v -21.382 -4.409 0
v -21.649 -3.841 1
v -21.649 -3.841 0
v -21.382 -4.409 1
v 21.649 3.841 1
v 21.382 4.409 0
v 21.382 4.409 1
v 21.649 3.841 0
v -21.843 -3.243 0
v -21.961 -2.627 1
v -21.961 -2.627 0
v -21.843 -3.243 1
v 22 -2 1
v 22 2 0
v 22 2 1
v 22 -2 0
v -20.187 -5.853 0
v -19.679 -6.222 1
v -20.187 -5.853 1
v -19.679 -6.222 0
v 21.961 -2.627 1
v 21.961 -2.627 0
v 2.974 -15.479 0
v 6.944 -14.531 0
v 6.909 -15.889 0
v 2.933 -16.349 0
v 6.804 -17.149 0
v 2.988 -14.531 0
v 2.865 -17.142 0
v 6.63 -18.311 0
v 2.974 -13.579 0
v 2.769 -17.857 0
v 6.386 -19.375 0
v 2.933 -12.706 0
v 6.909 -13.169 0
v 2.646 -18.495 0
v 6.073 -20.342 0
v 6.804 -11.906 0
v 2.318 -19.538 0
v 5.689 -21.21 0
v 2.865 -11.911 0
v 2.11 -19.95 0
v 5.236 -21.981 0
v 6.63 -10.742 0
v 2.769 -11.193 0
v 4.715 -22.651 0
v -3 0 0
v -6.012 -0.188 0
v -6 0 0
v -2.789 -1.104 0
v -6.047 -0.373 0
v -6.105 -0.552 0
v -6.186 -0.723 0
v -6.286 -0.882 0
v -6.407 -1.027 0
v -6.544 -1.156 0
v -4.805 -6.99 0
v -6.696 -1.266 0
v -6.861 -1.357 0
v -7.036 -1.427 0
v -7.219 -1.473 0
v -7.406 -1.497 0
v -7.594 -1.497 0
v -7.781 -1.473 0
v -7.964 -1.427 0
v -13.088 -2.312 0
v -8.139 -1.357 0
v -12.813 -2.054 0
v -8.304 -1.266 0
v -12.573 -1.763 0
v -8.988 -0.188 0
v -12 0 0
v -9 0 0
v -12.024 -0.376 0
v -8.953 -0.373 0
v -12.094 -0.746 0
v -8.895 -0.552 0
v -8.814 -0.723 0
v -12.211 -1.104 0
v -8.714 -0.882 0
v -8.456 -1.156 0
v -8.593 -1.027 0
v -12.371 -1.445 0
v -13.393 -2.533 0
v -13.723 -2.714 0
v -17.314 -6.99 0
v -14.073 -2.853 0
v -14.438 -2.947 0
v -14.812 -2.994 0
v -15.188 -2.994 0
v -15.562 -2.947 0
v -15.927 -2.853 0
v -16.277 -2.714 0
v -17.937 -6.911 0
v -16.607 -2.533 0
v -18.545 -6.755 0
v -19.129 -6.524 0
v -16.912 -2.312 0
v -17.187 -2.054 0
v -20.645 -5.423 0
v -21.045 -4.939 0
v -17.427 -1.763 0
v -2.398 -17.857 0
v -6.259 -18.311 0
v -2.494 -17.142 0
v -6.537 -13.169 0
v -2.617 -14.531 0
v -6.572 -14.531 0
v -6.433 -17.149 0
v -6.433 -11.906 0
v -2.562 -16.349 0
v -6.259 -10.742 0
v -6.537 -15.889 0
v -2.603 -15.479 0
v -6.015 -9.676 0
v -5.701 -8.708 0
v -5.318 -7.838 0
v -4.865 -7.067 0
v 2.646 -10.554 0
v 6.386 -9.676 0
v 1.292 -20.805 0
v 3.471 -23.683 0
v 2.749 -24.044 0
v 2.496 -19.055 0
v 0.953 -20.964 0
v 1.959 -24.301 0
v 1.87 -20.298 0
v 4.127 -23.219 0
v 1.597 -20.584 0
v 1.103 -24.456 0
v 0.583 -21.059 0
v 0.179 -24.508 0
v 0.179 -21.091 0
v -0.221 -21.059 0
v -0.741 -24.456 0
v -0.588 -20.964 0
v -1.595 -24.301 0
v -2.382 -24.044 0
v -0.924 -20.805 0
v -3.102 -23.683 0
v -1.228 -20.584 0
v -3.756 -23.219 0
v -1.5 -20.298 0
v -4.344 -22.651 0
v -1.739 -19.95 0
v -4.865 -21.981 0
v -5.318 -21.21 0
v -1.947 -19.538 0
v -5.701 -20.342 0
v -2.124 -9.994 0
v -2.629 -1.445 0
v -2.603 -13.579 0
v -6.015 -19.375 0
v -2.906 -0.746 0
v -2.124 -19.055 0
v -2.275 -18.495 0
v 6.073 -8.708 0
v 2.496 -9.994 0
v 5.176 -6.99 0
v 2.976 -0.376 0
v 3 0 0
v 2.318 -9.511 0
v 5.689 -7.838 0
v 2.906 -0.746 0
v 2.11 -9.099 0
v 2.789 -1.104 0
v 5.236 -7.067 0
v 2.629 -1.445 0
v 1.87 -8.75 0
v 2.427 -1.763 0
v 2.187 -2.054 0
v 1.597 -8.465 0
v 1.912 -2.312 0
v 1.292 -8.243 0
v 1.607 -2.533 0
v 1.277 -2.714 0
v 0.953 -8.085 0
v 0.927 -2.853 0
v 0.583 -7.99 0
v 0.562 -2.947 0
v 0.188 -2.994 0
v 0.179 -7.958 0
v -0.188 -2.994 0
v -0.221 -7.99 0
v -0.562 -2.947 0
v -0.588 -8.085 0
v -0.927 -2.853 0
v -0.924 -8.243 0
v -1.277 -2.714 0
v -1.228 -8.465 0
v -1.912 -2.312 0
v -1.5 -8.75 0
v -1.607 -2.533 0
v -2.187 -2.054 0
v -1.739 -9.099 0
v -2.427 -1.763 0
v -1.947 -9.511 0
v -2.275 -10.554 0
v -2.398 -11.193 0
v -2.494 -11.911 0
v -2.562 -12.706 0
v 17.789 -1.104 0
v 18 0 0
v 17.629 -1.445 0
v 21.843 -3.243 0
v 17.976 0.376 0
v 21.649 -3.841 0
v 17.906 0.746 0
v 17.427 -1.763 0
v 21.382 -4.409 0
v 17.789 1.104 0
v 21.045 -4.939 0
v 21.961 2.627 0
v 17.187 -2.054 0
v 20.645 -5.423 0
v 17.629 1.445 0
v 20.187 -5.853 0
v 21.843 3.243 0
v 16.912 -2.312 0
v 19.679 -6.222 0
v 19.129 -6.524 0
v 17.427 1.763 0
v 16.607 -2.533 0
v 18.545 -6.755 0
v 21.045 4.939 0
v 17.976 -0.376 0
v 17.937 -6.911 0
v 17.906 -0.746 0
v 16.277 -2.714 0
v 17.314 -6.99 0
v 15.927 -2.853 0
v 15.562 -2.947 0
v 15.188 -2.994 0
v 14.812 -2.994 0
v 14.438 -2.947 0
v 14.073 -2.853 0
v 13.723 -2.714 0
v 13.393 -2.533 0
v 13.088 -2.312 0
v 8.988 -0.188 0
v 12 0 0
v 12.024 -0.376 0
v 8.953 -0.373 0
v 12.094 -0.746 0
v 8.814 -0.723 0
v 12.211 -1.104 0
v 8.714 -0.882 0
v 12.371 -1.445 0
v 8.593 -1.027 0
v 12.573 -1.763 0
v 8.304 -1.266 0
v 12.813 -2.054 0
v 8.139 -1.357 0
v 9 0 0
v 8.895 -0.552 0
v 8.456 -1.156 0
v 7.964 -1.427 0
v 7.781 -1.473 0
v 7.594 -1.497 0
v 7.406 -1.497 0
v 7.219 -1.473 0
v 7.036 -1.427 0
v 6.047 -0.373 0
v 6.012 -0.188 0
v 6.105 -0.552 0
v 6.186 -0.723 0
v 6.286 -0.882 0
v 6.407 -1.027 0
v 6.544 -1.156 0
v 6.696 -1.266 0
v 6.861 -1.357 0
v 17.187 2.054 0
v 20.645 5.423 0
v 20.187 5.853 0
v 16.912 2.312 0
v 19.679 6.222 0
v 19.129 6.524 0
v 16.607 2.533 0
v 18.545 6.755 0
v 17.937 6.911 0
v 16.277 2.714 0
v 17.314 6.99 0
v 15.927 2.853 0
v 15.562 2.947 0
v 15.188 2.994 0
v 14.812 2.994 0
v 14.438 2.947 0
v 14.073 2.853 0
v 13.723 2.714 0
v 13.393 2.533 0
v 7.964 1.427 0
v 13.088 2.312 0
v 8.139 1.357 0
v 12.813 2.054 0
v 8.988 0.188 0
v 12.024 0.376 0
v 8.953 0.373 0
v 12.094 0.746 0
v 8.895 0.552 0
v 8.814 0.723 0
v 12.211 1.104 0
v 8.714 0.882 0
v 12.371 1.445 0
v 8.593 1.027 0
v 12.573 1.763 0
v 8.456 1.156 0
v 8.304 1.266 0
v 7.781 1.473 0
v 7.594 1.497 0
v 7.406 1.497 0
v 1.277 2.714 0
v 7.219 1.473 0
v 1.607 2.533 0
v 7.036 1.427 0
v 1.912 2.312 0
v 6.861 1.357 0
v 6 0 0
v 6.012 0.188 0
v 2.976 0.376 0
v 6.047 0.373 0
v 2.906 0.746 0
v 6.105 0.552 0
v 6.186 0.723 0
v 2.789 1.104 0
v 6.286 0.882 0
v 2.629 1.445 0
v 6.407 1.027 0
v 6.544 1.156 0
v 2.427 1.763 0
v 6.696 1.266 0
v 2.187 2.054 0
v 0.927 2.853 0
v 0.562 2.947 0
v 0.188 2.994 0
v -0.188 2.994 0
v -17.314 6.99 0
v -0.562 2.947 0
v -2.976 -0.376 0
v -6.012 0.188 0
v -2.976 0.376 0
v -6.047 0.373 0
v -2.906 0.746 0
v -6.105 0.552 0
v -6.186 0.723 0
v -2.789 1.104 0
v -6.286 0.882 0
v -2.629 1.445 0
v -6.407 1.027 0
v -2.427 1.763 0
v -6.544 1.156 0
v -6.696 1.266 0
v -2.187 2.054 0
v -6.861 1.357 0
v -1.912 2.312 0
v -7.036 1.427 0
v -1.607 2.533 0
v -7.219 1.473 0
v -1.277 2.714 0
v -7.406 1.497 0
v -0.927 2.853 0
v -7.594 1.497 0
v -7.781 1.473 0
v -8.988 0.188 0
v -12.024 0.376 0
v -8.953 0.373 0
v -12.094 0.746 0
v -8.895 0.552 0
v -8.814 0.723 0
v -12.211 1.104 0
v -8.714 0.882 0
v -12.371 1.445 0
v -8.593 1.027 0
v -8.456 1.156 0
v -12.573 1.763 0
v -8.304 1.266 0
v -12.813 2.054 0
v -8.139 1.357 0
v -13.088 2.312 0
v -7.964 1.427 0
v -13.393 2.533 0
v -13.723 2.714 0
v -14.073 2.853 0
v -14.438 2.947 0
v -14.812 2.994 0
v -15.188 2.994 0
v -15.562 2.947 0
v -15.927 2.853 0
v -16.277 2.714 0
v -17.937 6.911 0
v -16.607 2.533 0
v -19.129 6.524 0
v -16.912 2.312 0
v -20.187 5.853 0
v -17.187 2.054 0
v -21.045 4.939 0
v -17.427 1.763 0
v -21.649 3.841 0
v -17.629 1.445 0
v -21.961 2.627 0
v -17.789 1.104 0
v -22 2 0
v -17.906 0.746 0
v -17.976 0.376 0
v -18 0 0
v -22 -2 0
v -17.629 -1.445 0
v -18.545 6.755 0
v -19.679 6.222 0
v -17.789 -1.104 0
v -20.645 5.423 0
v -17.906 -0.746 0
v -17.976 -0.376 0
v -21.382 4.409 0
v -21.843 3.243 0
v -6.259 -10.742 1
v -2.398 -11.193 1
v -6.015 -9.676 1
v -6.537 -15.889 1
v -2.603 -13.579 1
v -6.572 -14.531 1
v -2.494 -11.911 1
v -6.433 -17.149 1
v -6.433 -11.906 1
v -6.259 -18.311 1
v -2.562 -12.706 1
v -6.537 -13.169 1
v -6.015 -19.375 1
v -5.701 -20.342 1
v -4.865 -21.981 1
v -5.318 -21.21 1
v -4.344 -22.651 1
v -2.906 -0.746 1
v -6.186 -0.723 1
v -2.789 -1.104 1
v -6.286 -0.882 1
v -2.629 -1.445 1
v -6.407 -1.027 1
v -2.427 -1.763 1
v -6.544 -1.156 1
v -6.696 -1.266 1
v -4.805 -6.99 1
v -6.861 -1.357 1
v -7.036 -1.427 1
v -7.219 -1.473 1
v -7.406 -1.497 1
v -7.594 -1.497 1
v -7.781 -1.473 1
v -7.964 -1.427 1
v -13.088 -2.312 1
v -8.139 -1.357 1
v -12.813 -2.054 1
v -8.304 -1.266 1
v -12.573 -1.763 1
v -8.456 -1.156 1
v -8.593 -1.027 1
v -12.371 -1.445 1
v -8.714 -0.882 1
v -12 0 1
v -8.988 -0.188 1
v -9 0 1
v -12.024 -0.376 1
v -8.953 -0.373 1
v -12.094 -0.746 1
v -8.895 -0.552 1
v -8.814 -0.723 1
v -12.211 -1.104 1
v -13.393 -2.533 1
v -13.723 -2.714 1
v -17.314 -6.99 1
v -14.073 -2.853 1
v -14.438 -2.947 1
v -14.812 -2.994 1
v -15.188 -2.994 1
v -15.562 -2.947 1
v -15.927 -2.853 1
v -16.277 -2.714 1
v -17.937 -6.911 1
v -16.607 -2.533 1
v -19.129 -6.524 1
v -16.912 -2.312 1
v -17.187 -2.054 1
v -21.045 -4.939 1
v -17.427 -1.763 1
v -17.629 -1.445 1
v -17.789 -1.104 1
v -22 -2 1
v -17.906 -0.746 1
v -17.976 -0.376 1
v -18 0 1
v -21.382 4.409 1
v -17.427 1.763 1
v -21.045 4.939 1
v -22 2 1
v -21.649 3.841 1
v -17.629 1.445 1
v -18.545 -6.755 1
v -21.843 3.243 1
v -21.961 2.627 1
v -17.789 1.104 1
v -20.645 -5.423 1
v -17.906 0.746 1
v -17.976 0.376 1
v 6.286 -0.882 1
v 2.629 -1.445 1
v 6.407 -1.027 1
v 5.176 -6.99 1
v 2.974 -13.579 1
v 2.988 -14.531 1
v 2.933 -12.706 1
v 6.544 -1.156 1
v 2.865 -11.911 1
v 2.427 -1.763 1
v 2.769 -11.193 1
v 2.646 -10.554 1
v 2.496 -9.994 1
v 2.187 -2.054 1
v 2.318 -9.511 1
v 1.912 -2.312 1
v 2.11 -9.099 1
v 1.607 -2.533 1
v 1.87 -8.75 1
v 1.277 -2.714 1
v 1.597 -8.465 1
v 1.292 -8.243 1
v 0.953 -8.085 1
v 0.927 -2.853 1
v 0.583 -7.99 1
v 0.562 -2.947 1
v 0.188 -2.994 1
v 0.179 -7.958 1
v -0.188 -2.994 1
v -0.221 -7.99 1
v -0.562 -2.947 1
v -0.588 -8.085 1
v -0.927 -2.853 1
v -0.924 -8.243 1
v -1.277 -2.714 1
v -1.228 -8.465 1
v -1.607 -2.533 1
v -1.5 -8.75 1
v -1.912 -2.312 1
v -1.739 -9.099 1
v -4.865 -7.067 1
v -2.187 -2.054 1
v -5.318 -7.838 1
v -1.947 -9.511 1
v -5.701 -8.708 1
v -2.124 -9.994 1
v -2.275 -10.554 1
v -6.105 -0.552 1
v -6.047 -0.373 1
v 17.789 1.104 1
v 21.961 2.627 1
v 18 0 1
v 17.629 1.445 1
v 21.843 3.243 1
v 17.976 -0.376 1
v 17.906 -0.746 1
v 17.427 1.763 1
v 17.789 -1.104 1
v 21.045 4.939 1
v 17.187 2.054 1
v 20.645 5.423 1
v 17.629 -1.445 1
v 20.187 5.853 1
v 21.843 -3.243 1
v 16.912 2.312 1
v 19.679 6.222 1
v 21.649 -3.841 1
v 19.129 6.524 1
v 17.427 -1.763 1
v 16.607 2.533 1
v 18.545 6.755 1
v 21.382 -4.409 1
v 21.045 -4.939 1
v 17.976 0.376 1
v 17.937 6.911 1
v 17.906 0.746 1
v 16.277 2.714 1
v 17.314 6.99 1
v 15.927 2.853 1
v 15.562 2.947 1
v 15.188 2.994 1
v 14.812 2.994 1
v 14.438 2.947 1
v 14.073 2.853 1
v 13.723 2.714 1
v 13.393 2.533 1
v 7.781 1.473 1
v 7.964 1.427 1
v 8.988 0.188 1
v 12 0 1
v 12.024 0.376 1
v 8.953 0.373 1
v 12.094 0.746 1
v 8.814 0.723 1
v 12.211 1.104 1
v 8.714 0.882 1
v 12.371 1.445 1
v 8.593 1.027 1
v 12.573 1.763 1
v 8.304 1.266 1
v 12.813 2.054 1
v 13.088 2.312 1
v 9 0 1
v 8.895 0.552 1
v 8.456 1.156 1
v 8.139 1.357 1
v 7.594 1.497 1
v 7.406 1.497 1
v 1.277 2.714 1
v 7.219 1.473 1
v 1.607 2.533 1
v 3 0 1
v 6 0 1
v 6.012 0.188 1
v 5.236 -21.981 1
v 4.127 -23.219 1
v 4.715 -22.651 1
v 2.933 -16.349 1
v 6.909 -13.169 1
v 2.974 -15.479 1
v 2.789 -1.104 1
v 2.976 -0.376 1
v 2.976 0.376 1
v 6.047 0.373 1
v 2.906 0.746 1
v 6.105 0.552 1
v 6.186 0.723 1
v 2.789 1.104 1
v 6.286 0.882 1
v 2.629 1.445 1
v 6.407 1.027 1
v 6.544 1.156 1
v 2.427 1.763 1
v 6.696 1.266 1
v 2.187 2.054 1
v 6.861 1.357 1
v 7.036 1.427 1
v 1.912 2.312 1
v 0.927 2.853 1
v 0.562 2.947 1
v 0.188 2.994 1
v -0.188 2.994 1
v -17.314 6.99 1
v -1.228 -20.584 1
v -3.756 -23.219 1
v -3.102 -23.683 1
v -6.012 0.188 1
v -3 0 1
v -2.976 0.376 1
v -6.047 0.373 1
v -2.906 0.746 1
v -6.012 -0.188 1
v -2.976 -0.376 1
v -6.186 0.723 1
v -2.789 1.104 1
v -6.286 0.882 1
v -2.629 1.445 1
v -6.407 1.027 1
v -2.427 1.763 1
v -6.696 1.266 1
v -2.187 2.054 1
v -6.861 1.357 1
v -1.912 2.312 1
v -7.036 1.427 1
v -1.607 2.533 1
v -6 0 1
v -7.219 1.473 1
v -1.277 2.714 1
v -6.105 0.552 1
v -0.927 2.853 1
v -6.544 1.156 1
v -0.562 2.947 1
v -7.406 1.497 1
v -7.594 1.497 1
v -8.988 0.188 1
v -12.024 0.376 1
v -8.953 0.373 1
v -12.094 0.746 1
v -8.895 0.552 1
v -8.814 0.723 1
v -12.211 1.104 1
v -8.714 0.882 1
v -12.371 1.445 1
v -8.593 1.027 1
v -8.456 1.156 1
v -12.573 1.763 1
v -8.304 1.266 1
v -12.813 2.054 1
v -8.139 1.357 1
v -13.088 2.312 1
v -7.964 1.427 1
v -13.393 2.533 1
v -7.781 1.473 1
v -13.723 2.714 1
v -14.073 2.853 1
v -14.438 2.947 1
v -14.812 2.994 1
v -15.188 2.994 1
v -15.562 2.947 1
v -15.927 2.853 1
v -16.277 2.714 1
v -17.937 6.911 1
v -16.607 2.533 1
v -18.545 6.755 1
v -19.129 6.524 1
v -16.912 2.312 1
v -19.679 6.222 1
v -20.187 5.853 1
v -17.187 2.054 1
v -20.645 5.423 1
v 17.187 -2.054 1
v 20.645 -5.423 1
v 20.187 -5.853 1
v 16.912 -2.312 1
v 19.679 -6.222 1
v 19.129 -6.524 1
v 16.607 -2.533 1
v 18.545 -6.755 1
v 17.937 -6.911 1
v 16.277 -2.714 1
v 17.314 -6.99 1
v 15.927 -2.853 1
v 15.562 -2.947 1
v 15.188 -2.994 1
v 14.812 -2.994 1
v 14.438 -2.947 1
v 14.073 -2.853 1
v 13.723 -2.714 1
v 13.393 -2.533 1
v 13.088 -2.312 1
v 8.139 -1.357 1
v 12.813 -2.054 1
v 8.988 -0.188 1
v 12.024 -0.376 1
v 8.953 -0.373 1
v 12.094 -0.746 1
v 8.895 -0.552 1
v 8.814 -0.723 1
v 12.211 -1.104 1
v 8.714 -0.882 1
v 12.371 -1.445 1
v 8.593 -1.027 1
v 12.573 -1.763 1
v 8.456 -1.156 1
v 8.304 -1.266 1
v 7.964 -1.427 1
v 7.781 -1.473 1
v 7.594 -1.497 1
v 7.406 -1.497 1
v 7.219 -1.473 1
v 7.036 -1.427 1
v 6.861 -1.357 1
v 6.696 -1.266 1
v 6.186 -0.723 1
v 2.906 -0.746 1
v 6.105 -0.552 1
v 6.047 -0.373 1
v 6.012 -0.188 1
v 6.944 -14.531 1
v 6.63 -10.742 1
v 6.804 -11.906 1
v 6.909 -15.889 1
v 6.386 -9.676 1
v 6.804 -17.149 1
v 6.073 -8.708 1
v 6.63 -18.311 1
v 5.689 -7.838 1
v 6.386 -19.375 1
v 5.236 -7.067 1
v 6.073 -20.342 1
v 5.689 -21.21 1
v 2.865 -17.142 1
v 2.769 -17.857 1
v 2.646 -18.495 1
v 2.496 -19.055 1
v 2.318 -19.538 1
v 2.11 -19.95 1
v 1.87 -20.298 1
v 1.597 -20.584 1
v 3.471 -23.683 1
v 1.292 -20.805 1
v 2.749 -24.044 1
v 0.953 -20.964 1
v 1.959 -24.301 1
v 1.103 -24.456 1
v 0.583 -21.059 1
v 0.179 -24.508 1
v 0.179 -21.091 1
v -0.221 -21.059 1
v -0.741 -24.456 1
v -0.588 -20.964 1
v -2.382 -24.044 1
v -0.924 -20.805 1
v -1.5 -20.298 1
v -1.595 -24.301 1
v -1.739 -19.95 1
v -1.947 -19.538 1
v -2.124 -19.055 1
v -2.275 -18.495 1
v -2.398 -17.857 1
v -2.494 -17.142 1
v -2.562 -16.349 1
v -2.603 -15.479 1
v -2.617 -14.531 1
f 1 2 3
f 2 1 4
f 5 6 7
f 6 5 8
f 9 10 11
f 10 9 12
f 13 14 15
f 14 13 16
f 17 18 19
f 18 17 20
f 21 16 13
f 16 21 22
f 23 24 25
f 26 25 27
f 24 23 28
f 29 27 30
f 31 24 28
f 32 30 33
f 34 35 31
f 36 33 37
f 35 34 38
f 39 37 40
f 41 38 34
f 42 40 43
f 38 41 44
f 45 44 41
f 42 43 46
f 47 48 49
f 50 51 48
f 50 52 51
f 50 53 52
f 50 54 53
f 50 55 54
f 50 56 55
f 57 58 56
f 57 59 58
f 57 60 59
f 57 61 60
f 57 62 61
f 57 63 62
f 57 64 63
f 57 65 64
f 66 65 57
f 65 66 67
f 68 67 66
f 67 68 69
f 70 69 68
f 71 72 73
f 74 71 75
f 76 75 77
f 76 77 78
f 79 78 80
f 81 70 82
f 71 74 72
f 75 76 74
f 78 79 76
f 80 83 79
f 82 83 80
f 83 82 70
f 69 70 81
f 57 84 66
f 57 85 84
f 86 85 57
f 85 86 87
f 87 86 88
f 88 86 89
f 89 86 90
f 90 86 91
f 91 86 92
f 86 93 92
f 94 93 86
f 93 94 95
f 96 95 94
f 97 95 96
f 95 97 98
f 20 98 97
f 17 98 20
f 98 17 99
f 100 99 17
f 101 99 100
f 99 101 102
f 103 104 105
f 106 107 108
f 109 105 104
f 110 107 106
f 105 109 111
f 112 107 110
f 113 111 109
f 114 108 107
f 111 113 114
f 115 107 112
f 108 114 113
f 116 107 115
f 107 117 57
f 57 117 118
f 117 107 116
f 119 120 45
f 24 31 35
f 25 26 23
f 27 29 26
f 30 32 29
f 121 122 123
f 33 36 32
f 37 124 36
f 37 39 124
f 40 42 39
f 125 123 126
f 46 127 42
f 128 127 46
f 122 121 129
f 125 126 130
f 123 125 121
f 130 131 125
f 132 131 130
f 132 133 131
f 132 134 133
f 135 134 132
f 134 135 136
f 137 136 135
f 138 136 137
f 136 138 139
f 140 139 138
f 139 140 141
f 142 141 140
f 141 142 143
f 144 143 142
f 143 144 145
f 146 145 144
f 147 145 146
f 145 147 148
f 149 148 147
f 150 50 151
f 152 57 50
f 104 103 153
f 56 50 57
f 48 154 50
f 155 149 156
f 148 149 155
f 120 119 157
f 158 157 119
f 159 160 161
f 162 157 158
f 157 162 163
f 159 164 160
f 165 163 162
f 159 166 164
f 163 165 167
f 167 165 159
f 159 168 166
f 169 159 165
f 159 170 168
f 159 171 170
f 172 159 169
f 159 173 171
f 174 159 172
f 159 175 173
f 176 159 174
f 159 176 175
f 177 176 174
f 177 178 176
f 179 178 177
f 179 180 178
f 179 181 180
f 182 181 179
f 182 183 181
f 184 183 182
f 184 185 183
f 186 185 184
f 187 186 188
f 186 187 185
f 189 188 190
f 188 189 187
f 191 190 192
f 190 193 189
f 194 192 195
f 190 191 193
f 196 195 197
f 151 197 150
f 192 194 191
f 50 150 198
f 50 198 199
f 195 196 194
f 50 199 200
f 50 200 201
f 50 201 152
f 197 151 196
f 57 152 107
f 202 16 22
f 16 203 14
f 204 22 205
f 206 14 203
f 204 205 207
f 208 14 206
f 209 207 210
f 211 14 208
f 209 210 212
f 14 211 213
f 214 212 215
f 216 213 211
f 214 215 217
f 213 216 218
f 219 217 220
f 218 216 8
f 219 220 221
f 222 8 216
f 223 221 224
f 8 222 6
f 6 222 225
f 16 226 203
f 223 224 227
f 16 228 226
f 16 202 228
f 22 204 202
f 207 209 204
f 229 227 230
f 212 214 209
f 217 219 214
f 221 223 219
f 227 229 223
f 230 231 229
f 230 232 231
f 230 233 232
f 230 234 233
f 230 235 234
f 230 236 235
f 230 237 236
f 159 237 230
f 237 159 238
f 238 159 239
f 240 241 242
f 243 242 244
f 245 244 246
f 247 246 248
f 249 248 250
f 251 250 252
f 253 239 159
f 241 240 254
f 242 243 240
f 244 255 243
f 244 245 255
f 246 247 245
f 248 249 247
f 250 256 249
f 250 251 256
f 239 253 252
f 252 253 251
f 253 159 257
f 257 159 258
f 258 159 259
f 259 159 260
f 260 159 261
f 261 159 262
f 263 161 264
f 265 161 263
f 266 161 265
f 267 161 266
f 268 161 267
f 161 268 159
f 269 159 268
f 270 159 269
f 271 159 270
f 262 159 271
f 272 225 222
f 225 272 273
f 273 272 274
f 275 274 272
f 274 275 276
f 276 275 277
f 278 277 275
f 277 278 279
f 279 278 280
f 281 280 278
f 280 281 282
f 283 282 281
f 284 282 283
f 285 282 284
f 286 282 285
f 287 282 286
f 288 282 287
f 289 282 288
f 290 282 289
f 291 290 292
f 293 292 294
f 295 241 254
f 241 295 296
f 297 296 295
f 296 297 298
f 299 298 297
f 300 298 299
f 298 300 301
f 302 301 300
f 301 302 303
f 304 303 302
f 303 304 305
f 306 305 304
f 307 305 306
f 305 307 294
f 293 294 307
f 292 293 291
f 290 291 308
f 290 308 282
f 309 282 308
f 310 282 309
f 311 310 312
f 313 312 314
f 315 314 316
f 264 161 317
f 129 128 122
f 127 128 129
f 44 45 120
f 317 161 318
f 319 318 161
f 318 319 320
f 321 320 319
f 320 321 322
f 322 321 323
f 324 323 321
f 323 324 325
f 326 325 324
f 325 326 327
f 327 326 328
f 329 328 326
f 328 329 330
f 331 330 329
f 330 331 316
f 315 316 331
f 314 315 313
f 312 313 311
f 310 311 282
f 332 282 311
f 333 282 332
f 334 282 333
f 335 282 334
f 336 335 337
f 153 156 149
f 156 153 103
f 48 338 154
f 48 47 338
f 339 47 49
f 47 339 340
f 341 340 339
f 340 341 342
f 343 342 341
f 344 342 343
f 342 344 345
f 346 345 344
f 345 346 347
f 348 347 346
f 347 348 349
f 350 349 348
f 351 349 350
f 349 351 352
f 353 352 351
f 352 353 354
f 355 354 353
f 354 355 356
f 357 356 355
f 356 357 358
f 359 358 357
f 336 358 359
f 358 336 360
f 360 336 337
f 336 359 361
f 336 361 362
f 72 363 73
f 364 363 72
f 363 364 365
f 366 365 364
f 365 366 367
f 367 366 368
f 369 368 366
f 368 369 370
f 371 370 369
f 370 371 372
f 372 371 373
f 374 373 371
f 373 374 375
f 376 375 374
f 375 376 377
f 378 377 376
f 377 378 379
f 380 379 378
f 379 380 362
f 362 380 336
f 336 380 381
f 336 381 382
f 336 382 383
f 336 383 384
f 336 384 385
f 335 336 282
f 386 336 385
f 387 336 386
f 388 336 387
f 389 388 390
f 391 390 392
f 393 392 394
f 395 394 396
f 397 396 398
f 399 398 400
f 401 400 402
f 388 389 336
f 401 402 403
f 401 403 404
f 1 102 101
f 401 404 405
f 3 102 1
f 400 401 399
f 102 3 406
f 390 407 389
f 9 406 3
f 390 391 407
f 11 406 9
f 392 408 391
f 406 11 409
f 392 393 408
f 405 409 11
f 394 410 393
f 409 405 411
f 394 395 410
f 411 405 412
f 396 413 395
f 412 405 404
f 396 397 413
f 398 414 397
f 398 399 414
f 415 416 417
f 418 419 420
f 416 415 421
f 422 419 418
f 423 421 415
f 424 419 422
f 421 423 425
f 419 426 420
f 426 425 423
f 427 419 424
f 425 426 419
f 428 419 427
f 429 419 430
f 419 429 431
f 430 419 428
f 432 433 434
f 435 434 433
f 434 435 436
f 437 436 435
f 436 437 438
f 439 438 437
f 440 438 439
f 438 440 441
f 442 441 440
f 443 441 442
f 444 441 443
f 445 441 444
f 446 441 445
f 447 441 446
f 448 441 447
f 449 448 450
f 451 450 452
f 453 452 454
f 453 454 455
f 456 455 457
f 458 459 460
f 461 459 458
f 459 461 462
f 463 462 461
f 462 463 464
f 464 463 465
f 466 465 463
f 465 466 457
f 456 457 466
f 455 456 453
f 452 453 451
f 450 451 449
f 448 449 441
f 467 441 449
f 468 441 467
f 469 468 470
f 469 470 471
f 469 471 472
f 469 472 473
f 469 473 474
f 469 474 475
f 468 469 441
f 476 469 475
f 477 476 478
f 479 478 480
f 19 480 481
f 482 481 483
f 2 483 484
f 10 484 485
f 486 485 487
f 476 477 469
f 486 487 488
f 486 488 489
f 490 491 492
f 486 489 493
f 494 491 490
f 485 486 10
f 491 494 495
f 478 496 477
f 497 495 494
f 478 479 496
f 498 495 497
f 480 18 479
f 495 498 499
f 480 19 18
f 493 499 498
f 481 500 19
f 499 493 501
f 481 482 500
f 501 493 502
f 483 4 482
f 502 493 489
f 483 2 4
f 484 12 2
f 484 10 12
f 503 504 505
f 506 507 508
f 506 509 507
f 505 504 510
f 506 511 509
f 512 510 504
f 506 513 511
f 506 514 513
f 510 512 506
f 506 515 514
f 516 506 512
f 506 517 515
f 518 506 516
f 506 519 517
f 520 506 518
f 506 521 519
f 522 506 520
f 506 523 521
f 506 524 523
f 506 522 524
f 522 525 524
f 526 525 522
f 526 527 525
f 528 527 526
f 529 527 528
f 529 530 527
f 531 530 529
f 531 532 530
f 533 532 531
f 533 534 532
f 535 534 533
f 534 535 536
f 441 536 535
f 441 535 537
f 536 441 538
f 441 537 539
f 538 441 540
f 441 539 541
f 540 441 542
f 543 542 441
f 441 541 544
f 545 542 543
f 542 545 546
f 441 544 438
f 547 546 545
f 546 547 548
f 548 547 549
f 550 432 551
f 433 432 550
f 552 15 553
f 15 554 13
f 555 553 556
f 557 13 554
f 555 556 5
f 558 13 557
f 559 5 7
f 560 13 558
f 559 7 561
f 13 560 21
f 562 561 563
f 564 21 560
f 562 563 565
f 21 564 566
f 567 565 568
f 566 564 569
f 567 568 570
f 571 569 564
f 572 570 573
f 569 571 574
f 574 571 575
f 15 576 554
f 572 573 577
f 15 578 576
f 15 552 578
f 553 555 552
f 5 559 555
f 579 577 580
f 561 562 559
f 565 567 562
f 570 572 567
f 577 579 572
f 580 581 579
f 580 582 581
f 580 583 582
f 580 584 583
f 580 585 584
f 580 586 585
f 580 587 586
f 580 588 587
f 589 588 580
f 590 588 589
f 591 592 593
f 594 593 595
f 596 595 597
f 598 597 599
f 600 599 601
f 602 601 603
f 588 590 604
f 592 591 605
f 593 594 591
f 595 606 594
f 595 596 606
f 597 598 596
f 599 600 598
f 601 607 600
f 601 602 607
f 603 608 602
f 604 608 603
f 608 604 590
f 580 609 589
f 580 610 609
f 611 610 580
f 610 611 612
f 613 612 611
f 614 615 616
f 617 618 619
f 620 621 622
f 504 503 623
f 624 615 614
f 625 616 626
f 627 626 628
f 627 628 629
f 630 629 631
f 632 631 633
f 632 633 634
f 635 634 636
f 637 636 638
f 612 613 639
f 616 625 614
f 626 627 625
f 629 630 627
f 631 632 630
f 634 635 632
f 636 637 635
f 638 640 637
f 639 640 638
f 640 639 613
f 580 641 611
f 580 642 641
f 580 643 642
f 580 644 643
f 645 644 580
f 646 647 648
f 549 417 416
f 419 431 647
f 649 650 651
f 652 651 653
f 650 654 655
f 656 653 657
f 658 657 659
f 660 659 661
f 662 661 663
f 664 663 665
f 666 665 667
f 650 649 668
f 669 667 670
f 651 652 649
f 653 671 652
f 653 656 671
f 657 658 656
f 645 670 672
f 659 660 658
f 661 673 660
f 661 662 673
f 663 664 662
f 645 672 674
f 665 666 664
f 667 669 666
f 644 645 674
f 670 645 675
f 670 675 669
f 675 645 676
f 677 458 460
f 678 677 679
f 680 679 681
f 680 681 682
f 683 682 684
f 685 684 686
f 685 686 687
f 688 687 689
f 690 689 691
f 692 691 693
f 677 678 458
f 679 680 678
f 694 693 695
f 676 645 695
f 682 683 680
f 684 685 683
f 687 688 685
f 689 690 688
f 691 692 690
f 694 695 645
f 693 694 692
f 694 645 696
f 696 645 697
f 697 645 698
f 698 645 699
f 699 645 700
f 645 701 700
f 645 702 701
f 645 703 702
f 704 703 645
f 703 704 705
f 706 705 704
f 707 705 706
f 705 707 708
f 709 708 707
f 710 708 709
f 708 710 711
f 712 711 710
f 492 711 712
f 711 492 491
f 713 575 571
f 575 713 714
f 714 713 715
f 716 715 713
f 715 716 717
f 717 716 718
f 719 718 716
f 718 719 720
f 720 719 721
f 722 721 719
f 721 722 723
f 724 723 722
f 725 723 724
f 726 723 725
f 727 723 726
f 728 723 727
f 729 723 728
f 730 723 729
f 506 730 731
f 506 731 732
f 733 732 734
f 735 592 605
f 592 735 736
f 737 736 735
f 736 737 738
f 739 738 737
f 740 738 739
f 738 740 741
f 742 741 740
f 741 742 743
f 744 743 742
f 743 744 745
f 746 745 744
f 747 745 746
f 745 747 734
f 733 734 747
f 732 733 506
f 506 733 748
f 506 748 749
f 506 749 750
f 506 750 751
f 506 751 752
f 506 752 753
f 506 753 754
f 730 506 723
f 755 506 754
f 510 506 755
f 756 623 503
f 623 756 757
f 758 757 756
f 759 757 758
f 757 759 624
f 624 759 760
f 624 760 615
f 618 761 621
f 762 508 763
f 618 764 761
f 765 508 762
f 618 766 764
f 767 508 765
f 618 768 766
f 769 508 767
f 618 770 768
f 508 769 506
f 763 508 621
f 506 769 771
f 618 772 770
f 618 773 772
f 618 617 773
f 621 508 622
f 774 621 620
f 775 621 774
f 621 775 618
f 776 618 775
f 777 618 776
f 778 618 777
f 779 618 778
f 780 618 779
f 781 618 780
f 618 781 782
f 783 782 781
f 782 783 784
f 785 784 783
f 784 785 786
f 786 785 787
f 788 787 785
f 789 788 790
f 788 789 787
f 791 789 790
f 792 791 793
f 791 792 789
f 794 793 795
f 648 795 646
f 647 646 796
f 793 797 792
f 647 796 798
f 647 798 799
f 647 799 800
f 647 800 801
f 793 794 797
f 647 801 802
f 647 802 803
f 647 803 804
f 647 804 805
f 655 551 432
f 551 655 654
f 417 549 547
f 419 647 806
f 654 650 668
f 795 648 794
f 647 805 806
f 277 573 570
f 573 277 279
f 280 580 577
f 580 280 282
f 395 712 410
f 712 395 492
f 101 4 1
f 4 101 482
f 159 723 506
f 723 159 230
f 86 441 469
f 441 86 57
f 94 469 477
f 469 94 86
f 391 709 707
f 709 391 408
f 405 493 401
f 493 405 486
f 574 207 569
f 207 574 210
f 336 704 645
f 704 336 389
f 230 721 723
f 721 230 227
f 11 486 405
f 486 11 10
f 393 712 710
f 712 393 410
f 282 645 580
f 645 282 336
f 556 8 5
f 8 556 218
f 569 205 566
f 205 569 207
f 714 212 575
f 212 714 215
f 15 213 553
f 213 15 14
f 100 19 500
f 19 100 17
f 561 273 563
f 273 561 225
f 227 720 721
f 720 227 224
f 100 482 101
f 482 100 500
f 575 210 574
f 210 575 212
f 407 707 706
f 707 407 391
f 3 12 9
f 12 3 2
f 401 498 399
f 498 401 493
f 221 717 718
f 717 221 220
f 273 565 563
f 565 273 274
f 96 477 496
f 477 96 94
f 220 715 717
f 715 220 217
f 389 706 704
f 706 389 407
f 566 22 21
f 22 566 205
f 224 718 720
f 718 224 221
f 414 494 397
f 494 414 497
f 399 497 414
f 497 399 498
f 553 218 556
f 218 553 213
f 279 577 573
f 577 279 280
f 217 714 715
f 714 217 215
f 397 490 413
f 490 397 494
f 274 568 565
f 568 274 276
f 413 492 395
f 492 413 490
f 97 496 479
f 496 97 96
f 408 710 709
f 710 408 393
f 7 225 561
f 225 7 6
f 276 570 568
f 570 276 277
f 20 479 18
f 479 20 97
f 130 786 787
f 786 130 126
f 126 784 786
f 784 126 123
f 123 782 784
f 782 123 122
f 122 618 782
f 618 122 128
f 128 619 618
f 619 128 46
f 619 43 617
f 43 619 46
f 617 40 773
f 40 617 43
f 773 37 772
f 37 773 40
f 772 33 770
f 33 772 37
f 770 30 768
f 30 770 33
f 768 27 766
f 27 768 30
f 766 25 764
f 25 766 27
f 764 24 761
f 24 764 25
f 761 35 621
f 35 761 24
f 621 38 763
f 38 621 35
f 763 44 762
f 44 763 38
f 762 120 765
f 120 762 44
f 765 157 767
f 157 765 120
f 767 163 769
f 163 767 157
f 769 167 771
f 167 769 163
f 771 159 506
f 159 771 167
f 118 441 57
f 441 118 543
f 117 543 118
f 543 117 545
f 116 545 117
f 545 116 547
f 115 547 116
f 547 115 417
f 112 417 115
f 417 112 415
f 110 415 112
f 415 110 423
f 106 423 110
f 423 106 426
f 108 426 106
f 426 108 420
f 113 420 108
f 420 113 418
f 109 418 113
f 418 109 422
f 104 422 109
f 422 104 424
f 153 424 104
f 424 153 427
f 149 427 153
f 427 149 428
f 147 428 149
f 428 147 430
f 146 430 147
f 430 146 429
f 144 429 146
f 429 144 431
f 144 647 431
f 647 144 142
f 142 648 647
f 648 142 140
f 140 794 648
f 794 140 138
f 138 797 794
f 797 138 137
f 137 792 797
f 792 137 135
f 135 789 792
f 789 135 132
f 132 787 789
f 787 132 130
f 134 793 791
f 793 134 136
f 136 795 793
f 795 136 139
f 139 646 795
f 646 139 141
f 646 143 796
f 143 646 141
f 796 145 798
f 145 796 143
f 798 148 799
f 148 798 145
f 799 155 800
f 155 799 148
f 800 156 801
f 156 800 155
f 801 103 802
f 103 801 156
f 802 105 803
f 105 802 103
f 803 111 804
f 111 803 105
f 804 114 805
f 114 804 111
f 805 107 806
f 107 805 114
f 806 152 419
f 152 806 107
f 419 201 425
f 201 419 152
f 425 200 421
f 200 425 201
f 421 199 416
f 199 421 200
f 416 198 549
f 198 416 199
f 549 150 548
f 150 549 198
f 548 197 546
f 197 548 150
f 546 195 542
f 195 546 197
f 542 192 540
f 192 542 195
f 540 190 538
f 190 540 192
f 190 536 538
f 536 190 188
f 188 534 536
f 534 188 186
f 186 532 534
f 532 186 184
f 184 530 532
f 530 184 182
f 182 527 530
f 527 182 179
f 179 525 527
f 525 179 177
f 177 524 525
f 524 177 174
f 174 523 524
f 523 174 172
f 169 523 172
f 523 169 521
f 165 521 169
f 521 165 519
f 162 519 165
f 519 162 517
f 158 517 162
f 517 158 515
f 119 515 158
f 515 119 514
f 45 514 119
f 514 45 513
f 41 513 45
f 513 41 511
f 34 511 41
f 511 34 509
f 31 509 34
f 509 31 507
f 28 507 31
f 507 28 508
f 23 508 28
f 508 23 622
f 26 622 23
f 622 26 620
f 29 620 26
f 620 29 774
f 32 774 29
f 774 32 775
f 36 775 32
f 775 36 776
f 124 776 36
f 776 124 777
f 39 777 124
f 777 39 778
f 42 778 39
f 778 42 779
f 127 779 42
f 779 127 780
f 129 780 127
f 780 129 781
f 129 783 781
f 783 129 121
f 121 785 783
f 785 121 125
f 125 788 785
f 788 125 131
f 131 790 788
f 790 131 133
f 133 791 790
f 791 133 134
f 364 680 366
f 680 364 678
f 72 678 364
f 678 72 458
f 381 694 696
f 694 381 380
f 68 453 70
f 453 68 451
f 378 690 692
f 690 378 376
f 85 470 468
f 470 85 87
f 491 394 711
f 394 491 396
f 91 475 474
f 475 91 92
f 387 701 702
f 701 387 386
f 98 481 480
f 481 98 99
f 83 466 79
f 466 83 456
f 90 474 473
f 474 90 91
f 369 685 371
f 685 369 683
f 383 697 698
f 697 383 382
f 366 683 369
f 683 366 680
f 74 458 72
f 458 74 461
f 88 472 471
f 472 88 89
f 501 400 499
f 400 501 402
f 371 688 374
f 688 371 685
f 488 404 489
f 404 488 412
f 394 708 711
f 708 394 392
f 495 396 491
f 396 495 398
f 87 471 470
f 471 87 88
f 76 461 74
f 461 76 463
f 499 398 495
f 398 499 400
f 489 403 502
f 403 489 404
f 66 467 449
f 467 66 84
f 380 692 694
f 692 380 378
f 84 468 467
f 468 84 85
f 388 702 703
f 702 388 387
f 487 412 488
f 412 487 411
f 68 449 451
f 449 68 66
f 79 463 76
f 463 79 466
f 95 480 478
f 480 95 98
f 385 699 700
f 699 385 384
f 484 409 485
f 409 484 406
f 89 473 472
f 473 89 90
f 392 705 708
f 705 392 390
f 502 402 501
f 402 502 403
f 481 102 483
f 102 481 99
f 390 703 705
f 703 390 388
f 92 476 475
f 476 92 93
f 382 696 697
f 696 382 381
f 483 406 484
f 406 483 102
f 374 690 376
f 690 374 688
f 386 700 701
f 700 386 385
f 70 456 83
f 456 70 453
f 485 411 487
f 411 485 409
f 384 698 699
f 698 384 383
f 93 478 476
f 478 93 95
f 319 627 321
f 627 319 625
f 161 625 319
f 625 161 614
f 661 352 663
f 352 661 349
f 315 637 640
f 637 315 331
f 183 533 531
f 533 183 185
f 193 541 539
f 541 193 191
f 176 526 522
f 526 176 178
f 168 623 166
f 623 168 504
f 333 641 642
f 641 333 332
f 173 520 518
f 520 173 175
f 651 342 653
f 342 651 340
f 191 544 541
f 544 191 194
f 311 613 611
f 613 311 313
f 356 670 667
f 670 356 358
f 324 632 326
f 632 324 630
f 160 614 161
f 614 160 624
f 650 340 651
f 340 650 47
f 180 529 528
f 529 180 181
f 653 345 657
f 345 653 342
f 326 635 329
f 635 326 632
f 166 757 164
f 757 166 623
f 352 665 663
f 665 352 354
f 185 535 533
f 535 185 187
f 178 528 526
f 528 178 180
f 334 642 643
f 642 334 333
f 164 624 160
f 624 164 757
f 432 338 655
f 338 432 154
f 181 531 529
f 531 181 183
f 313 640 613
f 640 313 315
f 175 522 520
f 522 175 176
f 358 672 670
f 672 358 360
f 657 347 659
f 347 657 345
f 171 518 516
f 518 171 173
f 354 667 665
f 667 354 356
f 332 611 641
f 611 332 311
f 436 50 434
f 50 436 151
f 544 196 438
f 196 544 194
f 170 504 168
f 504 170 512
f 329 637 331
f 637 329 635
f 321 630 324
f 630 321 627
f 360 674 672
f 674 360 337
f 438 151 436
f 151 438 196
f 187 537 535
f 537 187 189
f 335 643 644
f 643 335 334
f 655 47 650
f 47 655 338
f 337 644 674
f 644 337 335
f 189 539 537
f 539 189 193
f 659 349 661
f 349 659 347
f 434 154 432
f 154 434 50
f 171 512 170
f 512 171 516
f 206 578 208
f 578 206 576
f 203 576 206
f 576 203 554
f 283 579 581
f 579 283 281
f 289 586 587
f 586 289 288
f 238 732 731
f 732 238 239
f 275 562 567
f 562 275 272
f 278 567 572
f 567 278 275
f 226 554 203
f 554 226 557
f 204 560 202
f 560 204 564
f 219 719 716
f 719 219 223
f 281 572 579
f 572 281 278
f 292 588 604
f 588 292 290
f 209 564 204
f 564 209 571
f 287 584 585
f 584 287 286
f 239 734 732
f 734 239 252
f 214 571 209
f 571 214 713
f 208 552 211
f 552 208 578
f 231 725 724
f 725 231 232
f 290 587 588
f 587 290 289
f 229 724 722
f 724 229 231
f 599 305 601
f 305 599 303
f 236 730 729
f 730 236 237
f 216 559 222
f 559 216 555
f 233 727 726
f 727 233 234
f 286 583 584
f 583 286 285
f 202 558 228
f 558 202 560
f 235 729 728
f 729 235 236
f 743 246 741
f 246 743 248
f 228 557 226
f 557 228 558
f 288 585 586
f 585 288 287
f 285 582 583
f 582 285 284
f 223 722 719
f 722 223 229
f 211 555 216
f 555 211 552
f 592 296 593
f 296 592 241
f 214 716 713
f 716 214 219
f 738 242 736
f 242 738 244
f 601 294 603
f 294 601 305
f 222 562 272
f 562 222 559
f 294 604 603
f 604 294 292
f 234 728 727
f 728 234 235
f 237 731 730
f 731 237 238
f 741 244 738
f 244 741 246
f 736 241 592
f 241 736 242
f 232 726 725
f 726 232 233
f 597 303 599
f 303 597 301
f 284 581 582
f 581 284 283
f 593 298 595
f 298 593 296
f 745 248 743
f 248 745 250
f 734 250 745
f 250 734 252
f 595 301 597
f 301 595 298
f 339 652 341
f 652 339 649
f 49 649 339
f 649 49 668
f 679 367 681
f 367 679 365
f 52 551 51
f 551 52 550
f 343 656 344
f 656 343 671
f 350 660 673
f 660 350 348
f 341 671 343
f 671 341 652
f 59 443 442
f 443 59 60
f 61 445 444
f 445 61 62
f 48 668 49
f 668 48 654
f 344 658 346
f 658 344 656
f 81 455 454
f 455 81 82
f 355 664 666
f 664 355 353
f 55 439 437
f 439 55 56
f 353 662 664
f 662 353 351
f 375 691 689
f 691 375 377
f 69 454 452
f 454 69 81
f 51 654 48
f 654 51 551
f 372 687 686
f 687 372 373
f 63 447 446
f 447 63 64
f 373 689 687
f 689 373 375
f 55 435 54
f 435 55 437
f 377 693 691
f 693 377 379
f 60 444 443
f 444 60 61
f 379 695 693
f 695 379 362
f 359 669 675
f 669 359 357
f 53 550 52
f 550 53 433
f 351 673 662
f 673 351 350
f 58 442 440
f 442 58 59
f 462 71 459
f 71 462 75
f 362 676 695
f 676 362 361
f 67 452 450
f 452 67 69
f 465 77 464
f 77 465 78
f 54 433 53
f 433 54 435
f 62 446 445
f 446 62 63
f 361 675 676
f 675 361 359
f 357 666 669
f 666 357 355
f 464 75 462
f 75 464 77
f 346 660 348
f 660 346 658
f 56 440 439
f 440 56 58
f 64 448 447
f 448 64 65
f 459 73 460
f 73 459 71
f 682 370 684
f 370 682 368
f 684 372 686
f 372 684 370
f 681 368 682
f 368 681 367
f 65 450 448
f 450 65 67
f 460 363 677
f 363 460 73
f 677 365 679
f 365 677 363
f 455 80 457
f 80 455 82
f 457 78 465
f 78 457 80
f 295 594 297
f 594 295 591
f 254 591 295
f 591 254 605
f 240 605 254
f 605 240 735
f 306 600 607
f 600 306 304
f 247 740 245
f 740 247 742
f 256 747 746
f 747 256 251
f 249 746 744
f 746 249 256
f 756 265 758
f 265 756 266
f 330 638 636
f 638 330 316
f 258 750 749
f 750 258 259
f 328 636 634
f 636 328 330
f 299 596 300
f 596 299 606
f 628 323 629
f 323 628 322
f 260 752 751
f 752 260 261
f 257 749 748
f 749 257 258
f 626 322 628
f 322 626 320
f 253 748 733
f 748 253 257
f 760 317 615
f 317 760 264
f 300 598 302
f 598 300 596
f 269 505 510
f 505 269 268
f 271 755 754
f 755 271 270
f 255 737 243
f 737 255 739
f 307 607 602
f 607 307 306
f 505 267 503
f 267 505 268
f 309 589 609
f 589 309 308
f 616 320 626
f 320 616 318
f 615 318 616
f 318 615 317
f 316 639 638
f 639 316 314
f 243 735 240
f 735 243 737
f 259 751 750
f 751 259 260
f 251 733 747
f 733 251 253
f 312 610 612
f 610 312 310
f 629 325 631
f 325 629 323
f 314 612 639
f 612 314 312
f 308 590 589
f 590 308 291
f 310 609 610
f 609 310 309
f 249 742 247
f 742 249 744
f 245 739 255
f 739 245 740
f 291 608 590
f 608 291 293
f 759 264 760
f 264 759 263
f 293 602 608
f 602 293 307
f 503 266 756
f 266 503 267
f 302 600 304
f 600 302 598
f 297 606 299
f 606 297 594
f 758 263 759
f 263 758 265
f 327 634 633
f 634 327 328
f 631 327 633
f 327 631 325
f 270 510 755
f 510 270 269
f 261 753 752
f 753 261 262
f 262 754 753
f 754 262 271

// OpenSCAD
$fn = 50;


difference() {
	union() {
		hull() {
			translate(v = [-17.0000000000, 2.0000000000, 0]) {
				cylinder(h = 1, r = 5);
			}
			translate(v = [17.0000000000, 2.0000000000, 0]) {
				cylinder(h = 1, r = 5);
			}
			translate(v = [-17.0000000000, -2.0000000000, 0]) {
				cylinder(h = 1, r = 5);
			}
			translate(v = [17.0000000000, -2.0000000000, 0]) {
				cylinder(h = 1, r = 5);
			}
		}
		translate(v = [0, -5, 0]) {
			linear_extrude(height = 1) {
				text(font = "DejaVu Sans Mono:style=Bold", halign = "center", size = 19.0000000000, text = "O", valign = "top");
			}
		}
	}
	union() {
		translate(v = [-15.0000000000, 0.0000000000, 0]) {
			translate(v = [0, 0, -100]) {
				cylinder(h = 200, r = 3.0000000000);
			}
		}
		translate(v = [0, 0, -100]) {
			cylinder(h = 200, r = 3.0000000000);
		}
		translate(v = [15.0000000000, 0.0000000000, 0]) {
			translate(v = [0, 0, -100]) {
				cylinder(h = 200, r = 3.0000000000);
			}
		}
		translate(v = [-15.0000000000, 0.0000000000, 0]) {
			translate(v = [0, 0, -100]) {
				cylinder(h = 200, r = 1.5000000000);
			}
		}
		translate(v = [-7.5000000000, 0.0000000000, 0]) {
			translate(v = [0, 0, -100]) {
				cylinder(h = 200, r = 1.5000000000);
			}
		}
		translate(v = [0, 0, -100]) {
			cylinder(h = 200, r = 1.5000000000);
		}
		translate(v = [7.5000000000, 0.0000000000, 0]) {
			translate(v = [0, 0, -100]) {
				cylinder(h = 200, r = 1.5000000000);
			}
		}
		translate(v = [15.0000000000, 0.0000000000, 0]) {
			translate(v = [0, 0, -100]) {
				cylinder(h = 200, r = 1.5000000000);
			}
		}
	}
}
